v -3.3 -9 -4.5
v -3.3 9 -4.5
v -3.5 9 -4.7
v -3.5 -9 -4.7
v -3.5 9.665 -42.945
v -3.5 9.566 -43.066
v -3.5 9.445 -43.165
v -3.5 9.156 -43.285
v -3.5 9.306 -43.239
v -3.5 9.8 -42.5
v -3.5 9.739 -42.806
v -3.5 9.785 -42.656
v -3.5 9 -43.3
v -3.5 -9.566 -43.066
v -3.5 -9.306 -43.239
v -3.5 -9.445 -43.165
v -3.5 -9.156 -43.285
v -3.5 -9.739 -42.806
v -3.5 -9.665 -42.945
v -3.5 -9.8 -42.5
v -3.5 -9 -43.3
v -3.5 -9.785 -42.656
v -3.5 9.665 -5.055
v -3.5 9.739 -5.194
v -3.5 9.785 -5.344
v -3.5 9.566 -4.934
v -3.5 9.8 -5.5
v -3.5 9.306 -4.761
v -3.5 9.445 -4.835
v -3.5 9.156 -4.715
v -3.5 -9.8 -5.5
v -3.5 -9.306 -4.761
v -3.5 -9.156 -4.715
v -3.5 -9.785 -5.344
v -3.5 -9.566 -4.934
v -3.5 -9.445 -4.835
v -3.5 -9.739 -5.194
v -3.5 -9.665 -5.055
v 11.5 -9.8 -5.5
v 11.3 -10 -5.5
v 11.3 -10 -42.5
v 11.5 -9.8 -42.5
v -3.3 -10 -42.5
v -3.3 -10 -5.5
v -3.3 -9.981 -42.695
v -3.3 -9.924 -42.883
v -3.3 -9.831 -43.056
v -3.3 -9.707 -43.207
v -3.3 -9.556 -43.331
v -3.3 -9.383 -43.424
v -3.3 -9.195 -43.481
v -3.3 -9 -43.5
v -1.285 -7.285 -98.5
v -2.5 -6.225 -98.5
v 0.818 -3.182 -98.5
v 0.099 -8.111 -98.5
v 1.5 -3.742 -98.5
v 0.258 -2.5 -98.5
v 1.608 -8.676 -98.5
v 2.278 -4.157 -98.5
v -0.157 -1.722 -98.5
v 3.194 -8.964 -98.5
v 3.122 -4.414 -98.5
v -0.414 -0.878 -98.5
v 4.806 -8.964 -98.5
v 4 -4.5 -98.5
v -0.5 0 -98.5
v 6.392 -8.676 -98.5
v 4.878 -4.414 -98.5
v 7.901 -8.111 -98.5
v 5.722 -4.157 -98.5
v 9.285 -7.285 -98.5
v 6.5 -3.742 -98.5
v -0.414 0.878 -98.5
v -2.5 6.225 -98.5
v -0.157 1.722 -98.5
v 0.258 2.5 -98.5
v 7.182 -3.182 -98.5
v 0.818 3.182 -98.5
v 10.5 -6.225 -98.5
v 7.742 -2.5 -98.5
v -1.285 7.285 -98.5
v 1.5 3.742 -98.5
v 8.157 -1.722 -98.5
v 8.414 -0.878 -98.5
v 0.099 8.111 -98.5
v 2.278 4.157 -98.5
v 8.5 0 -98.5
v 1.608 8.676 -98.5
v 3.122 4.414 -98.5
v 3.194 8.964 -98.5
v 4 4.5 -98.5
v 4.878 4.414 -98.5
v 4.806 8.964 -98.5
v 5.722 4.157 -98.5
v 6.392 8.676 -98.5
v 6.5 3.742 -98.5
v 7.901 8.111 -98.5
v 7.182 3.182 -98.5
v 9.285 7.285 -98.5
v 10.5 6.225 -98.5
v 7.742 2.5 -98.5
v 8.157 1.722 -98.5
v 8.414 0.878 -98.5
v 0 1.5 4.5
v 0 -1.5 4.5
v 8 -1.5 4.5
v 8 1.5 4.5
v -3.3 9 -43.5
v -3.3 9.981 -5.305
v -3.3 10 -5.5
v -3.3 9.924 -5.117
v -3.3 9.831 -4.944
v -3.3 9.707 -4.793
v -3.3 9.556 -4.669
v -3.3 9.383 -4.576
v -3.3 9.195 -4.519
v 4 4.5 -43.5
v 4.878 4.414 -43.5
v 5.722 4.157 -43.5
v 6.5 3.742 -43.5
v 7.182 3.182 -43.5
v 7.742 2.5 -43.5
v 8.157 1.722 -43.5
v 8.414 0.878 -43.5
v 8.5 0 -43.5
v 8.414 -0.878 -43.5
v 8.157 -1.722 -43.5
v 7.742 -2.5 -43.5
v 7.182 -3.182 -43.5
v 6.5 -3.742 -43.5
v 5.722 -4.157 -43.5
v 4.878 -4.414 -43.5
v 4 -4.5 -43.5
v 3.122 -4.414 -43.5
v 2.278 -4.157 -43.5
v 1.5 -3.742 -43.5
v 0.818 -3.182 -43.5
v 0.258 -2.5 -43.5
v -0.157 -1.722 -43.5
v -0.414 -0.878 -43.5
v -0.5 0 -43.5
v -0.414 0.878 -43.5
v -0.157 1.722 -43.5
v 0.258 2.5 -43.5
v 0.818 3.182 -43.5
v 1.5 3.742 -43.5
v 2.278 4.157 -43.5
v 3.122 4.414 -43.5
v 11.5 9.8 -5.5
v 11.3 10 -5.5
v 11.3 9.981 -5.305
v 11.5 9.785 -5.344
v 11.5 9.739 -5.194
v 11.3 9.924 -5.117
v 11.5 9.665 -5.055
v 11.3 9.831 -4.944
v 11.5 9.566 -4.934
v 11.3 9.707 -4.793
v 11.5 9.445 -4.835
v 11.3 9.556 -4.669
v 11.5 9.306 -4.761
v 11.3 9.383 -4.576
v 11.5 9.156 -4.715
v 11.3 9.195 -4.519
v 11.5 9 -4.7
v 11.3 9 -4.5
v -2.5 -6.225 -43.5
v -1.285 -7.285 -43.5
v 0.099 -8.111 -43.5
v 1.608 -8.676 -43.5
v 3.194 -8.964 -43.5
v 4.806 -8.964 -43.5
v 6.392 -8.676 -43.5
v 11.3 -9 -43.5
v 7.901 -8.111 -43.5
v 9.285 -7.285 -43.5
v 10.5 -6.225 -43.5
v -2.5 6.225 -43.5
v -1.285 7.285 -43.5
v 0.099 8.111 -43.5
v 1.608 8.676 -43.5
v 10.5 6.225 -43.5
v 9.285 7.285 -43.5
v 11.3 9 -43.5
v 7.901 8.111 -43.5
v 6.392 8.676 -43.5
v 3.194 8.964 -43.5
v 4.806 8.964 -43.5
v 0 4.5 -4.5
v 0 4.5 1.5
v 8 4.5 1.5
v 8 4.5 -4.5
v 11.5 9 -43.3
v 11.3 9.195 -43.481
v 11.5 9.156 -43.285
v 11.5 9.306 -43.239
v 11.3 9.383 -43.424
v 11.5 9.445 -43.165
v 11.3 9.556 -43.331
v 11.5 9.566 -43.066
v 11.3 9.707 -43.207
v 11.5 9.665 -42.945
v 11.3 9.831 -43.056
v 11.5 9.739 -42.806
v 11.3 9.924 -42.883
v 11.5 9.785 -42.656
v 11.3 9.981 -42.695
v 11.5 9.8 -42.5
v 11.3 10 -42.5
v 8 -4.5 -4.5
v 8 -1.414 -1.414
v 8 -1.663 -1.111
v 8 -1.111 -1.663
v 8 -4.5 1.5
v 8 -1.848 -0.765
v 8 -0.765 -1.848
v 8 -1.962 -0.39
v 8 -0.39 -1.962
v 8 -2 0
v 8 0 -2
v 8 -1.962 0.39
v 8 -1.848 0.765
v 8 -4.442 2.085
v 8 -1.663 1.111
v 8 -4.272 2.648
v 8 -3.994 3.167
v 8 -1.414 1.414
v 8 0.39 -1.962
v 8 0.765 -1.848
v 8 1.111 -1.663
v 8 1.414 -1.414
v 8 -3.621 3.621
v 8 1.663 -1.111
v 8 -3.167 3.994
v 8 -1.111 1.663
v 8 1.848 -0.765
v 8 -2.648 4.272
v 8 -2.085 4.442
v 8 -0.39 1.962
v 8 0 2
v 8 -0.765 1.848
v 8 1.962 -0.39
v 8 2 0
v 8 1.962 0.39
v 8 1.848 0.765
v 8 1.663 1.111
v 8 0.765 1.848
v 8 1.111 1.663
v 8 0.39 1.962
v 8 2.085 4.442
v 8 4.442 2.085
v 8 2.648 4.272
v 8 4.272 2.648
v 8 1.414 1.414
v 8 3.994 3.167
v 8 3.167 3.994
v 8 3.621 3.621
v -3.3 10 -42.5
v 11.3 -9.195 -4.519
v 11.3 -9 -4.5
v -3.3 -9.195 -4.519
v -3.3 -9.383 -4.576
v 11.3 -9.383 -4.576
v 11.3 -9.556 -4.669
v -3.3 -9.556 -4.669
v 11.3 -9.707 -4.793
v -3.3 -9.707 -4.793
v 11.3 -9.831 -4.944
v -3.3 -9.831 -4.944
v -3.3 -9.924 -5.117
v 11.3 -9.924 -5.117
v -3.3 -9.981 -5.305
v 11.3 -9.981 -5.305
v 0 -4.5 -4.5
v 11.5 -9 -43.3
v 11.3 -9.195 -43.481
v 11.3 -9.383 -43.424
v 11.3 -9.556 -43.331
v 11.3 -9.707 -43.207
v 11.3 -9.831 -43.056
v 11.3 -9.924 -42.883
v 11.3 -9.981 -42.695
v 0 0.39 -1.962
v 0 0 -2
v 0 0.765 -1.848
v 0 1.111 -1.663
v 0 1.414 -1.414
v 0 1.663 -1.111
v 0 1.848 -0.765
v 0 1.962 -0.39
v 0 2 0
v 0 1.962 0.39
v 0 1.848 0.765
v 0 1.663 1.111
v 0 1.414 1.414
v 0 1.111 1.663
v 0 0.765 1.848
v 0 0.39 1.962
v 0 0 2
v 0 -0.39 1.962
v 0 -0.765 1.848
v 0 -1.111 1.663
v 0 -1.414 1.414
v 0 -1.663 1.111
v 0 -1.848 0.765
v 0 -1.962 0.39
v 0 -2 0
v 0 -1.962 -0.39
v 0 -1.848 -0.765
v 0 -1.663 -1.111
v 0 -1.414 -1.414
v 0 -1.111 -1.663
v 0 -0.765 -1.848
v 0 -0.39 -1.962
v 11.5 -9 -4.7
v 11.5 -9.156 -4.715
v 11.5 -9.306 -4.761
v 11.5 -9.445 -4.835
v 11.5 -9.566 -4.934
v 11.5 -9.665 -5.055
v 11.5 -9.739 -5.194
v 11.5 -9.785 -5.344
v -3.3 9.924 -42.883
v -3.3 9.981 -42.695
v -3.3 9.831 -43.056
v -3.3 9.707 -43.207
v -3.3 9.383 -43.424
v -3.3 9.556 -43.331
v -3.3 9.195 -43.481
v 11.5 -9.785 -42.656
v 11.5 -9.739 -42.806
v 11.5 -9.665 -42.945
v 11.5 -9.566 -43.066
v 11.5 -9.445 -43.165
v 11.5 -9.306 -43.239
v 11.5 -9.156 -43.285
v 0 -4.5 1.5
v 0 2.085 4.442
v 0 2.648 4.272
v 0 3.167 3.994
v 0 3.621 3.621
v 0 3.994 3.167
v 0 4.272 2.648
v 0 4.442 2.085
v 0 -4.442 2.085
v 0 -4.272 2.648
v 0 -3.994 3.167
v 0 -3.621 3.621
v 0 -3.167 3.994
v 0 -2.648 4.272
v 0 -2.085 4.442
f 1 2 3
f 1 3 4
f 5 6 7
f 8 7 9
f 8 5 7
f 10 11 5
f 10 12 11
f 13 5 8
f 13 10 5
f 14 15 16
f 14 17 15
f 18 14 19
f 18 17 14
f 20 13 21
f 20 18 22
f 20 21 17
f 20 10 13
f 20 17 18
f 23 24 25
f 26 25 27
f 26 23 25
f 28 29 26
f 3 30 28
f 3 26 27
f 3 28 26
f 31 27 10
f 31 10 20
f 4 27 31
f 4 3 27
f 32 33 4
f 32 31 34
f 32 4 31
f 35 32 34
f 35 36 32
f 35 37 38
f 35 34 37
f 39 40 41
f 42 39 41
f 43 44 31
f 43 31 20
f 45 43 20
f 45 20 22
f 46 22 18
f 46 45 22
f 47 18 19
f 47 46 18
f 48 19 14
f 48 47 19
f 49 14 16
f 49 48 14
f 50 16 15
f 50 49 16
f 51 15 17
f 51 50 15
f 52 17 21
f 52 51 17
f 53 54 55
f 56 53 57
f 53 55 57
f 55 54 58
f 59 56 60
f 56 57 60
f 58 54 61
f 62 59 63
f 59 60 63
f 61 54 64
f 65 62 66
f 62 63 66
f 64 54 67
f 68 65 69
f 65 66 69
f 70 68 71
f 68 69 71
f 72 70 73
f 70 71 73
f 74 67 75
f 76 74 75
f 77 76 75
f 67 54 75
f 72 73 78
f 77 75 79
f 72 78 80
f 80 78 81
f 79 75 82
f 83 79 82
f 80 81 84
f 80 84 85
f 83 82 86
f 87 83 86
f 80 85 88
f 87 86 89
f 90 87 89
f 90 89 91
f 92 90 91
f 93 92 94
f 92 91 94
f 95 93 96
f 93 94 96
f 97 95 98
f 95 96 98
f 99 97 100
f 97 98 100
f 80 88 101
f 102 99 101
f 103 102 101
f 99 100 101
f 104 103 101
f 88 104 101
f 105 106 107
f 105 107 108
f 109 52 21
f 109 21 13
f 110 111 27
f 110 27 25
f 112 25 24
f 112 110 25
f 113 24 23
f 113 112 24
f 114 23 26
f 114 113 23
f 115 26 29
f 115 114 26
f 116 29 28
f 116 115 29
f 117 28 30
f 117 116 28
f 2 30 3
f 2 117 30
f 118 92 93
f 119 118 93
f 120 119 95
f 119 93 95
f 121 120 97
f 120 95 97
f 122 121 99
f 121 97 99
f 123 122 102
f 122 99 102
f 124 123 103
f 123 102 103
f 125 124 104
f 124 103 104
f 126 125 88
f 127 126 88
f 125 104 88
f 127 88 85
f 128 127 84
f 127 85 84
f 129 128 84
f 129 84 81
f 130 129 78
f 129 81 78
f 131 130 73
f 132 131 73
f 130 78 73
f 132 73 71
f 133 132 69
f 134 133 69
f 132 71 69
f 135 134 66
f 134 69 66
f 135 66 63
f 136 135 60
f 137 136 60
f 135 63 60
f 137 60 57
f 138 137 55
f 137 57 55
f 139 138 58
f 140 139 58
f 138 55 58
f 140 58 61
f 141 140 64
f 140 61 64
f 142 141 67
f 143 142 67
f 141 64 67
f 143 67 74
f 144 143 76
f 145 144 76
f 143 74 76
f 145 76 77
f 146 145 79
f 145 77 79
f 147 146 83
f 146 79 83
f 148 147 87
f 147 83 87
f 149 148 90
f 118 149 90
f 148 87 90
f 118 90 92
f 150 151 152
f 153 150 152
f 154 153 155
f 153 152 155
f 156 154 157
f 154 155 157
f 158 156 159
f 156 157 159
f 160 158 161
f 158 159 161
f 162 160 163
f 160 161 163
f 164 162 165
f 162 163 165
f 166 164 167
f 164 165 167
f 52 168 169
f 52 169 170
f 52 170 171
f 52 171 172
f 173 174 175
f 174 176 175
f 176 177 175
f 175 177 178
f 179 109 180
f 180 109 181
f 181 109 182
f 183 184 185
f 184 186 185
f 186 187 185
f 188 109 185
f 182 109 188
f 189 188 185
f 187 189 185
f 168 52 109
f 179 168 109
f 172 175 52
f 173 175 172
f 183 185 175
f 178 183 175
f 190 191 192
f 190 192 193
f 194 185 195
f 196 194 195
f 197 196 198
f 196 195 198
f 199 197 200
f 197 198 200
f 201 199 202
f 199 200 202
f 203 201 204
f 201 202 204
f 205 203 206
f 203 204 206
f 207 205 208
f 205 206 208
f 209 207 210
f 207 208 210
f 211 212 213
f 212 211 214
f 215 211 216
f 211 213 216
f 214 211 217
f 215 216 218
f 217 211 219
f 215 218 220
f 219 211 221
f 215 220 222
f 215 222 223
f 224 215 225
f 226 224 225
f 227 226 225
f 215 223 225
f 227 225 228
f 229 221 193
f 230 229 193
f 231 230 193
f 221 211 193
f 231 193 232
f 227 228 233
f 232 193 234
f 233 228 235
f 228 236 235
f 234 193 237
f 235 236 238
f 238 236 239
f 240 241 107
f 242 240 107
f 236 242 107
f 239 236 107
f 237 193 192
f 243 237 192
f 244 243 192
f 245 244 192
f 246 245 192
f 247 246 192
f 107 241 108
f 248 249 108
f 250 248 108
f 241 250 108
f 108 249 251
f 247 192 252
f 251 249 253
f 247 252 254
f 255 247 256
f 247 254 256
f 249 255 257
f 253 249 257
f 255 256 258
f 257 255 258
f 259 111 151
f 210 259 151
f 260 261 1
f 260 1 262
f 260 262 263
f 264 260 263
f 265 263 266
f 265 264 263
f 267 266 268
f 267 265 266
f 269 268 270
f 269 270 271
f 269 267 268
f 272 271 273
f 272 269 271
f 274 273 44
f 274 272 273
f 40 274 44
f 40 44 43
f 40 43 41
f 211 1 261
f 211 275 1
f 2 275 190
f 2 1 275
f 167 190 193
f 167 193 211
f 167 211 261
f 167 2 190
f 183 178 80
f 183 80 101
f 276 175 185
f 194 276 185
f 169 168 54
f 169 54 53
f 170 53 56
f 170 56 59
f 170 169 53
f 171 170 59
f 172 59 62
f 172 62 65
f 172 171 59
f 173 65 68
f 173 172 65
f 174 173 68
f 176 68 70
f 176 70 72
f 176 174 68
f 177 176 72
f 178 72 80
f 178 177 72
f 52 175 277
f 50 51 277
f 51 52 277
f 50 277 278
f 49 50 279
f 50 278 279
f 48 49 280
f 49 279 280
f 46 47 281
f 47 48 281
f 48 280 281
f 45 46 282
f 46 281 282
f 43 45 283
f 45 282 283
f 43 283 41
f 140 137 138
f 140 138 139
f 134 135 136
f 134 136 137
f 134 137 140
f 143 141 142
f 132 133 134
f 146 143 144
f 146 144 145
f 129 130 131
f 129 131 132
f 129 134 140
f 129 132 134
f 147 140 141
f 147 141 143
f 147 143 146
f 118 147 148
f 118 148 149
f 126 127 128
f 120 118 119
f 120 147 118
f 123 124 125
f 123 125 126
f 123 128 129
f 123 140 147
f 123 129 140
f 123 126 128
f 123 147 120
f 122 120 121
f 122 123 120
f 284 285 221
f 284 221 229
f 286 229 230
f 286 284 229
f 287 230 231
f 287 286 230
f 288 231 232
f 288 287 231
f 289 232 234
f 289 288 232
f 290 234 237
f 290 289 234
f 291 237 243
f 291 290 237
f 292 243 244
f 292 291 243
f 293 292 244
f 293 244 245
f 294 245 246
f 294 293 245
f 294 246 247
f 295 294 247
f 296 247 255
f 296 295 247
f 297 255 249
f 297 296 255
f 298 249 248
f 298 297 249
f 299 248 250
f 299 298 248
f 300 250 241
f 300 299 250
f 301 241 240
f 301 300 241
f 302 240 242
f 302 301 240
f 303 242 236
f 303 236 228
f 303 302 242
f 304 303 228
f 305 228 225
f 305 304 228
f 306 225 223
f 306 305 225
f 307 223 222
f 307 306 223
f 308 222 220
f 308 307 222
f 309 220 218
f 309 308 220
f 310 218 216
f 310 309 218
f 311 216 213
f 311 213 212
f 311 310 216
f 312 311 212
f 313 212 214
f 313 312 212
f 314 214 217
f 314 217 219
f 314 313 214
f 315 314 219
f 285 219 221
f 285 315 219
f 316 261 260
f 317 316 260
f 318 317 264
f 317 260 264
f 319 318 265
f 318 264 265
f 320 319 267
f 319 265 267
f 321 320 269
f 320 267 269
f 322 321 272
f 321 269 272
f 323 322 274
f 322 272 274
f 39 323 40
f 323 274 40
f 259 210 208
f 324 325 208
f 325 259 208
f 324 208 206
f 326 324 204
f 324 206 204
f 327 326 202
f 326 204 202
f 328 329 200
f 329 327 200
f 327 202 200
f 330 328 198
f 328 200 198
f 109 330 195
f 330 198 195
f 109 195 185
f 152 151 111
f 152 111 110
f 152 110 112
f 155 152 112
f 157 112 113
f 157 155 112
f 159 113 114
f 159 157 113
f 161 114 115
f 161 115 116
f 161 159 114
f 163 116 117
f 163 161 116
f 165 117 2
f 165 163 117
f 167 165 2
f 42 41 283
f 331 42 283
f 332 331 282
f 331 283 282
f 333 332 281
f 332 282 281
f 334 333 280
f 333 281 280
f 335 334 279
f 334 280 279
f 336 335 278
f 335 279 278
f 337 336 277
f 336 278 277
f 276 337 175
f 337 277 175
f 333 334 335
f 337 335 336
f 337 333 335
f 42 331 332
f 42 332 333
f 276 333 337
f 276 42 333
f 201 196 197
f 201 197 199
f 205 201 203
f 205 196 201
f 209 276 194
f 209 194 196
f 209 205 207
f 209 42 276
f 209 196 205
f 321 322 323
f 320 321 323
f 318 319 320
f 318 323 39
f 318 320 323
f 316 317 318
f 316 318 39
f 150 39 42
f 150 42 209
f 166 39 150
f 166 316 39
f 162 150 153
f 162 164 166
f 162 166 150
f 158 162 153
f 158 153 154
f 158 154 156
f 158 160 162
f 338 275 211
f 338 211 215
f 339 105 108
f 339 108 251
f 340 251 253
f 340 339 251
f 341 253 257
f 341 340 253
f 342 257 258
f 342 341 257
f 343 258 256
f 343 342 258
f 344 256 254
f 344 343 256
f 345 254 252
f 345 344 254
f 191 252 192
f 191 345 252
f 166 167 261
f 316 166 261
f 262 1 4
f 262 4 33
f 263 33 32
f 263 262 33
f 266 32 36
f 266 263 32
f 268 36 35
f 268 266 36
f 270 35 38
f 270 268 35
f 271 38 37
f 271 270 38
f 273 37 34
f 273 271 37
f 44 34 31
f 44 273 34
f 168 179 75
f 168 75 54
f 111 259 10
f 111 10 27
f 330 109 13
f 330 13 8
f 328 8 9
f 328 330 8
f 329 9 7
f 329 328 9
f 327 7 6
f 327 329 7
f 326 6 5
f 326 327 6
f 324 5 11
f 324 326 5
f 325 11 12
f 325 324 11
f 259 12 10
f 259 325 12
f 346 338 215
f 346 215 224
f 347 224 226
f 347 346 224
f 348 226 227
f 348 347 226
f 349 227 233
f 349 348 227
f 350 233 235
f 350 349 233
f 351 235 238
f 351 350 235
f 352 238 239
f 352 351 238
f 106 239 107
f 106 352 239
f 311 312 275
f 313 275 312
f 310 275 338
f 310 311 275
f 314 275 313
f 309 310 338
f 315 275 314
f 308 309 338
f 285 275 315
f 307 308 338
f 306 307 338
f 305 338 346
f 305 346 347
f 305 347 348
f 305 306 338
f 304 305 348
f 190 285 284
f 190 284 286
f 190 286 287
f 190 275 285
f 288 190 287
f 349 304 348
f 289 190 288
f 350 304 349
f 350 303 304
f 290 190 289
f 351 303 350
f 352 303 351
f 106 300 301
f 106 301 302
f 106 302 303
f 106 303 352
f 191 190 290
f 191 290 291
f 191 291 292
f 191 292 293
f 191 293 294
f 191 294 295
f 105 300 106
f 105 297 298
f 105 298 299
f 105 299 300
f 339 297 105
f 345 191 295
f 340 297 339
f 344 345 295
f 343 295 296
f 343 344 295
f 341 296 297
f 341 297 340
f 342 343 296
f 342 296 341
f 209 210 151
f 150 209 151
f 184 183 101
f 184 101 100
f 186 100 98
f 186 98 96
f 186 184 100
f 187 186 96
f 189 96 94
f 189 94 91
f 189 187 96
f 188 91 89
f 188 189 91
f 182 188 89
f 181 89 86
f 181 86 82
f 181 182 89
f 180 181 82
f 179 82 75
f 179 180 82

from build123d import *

# Parameters (mm, degrees)
SKETCH_1_R          = 2
EXTRUDE_1_DEPTH     = 8
EXTRUDE_2_DEPTH     = 39
EXTRUDE_3_DEPTH     = 55
SKETCH_4_R          = 4.5
CUT_EXTRUDE_1_DEPTH = 55
FILLET_1_R          = 1
CHAMFER_1_SIZE      = 0.2


with BuildPart() as part:
    # 草图1 → 凸台-拉伸1 (new body)
    with BuildSketch(Plane(origin=(0, 0, 0), x_dir=(0, 0, -1), z_dir=(1, 0, 0))):
        with BuildLine():
            Line((0, 4.5), (4.5, 4.5))
            Line((4.5, 4.5), (4.5, -4.5))
            Line((4.5, -4.5), (-1.5, -4.5))
            ThreePointArc((-1.5, -4.5), (-3.621320344, -3.621320344), (-4.5, -1.5))
            Line((-4.5, -1.5), (-4.5, 1.5))
            ThreePointArc((-4.5, 1.5), (-3.621320344, 3.621320344), (-1.5, 4.5))
            Line((-1.5, 4.5), (0, 4.5))
        make_face()
        Circle(SKETCH_1_R, mode=Mode.SUBTRACT)
    extrude(amount=EXTRUDE_1_DEPTH)

    # 草图2 → 凸台-拉伸2 (add)
    with BuildSketch(Plane(origin=(0, 0, -4.5), x_dir=(-1, 0, 0), z_dir=(0, 0, -1))):
        Polygon((-4, 10), (3.5, 10), (3.5, -10), (-11.5, -10), (-11.5, 10), align=None)
    extrude(amount=EXTRUDE_2_DEPTH)

    # 草图3 → 凸台-拉伸3 (add)
    with BuildSketch(Plane(origin=(0, 0, -43.5), x_dir=(-1, 0, 0), z_dir=(0, 0, -1))):
        with BuildLine():
            Line((2.5, 6.224949799), (2.5, -6.224949799))
            ThreePointArc((2.5, -6.224949799), (-4, -9), (-10.5, -6.224949799))
            Line((-10.5, -6.224949799), (-10.5, 6.224949799))
            ThreePointArc((-10.5, 6.224949799), (-4, 9), (2.5, 6.224949799))
        make_face()
    extrude(amount=EXTRUDE_3_DEPTH)

    # 草图4 → 切除-拉伸1 (cut)
    with BuildSketch(Plane(origin=(0, 0, -98.5), x_dir=(-1, 0, 0), z_dir=(0, 0, -1))):
        with Locations(Location((-4, 0, 0), (0, 0, 90))):
            Circle(SKETCH_4_R)
    extrude(amount=-CUT_EXTRUDE_1_DEPTH, mode=Mode.SUBTRACT)

    # 圆角1
    fillet_1_edges = [part.edges().sort_by_distance(p)[0] for p in [
        (4, -10, -4.5),
        (4, 10, -4.5),
        (4, 10, -43.5),
        (4, -10, -43.5),
    ]]
    fillet(fillet_1_edges, radius=FILLET_1_R - 0.0001)  # a hair under: the kernel refuses the full size

    # 倒角1
    chamfer_1_edges = [part.edges().sort_by_distance(p)[0] for p in [
        (-3.5, -10, -24),
        (11.5, -10, -24),
        (-3.5, 0, -4.5),
        (-3.5, 10, -24),
        (-3.5, 0, -43.5),
        (-3.5, 9.707136071, -4.792863929),
        (-3.5, 9.707136071, -43.207136071),
        (-3.5, -9.707136071, -43.207136071),
        (-3.5, -9.707136071, -4.792863929),
        (11.5, 0, -4.5),
        (11.5, 0, -43.5),
        (11.5, 10, -24),
        (11.5, 9.707136071, -4.792863929),
        (11.5, 9.707136071, -43.207136071),
        (11.5, -9.707136071, -43.207136071),
        (11.5, -9.707136071, -4.792863929),
    ]]
    chamfer(chamfer_1_edges, length=CHAMFER_1_SIZE)


solid = part.part
